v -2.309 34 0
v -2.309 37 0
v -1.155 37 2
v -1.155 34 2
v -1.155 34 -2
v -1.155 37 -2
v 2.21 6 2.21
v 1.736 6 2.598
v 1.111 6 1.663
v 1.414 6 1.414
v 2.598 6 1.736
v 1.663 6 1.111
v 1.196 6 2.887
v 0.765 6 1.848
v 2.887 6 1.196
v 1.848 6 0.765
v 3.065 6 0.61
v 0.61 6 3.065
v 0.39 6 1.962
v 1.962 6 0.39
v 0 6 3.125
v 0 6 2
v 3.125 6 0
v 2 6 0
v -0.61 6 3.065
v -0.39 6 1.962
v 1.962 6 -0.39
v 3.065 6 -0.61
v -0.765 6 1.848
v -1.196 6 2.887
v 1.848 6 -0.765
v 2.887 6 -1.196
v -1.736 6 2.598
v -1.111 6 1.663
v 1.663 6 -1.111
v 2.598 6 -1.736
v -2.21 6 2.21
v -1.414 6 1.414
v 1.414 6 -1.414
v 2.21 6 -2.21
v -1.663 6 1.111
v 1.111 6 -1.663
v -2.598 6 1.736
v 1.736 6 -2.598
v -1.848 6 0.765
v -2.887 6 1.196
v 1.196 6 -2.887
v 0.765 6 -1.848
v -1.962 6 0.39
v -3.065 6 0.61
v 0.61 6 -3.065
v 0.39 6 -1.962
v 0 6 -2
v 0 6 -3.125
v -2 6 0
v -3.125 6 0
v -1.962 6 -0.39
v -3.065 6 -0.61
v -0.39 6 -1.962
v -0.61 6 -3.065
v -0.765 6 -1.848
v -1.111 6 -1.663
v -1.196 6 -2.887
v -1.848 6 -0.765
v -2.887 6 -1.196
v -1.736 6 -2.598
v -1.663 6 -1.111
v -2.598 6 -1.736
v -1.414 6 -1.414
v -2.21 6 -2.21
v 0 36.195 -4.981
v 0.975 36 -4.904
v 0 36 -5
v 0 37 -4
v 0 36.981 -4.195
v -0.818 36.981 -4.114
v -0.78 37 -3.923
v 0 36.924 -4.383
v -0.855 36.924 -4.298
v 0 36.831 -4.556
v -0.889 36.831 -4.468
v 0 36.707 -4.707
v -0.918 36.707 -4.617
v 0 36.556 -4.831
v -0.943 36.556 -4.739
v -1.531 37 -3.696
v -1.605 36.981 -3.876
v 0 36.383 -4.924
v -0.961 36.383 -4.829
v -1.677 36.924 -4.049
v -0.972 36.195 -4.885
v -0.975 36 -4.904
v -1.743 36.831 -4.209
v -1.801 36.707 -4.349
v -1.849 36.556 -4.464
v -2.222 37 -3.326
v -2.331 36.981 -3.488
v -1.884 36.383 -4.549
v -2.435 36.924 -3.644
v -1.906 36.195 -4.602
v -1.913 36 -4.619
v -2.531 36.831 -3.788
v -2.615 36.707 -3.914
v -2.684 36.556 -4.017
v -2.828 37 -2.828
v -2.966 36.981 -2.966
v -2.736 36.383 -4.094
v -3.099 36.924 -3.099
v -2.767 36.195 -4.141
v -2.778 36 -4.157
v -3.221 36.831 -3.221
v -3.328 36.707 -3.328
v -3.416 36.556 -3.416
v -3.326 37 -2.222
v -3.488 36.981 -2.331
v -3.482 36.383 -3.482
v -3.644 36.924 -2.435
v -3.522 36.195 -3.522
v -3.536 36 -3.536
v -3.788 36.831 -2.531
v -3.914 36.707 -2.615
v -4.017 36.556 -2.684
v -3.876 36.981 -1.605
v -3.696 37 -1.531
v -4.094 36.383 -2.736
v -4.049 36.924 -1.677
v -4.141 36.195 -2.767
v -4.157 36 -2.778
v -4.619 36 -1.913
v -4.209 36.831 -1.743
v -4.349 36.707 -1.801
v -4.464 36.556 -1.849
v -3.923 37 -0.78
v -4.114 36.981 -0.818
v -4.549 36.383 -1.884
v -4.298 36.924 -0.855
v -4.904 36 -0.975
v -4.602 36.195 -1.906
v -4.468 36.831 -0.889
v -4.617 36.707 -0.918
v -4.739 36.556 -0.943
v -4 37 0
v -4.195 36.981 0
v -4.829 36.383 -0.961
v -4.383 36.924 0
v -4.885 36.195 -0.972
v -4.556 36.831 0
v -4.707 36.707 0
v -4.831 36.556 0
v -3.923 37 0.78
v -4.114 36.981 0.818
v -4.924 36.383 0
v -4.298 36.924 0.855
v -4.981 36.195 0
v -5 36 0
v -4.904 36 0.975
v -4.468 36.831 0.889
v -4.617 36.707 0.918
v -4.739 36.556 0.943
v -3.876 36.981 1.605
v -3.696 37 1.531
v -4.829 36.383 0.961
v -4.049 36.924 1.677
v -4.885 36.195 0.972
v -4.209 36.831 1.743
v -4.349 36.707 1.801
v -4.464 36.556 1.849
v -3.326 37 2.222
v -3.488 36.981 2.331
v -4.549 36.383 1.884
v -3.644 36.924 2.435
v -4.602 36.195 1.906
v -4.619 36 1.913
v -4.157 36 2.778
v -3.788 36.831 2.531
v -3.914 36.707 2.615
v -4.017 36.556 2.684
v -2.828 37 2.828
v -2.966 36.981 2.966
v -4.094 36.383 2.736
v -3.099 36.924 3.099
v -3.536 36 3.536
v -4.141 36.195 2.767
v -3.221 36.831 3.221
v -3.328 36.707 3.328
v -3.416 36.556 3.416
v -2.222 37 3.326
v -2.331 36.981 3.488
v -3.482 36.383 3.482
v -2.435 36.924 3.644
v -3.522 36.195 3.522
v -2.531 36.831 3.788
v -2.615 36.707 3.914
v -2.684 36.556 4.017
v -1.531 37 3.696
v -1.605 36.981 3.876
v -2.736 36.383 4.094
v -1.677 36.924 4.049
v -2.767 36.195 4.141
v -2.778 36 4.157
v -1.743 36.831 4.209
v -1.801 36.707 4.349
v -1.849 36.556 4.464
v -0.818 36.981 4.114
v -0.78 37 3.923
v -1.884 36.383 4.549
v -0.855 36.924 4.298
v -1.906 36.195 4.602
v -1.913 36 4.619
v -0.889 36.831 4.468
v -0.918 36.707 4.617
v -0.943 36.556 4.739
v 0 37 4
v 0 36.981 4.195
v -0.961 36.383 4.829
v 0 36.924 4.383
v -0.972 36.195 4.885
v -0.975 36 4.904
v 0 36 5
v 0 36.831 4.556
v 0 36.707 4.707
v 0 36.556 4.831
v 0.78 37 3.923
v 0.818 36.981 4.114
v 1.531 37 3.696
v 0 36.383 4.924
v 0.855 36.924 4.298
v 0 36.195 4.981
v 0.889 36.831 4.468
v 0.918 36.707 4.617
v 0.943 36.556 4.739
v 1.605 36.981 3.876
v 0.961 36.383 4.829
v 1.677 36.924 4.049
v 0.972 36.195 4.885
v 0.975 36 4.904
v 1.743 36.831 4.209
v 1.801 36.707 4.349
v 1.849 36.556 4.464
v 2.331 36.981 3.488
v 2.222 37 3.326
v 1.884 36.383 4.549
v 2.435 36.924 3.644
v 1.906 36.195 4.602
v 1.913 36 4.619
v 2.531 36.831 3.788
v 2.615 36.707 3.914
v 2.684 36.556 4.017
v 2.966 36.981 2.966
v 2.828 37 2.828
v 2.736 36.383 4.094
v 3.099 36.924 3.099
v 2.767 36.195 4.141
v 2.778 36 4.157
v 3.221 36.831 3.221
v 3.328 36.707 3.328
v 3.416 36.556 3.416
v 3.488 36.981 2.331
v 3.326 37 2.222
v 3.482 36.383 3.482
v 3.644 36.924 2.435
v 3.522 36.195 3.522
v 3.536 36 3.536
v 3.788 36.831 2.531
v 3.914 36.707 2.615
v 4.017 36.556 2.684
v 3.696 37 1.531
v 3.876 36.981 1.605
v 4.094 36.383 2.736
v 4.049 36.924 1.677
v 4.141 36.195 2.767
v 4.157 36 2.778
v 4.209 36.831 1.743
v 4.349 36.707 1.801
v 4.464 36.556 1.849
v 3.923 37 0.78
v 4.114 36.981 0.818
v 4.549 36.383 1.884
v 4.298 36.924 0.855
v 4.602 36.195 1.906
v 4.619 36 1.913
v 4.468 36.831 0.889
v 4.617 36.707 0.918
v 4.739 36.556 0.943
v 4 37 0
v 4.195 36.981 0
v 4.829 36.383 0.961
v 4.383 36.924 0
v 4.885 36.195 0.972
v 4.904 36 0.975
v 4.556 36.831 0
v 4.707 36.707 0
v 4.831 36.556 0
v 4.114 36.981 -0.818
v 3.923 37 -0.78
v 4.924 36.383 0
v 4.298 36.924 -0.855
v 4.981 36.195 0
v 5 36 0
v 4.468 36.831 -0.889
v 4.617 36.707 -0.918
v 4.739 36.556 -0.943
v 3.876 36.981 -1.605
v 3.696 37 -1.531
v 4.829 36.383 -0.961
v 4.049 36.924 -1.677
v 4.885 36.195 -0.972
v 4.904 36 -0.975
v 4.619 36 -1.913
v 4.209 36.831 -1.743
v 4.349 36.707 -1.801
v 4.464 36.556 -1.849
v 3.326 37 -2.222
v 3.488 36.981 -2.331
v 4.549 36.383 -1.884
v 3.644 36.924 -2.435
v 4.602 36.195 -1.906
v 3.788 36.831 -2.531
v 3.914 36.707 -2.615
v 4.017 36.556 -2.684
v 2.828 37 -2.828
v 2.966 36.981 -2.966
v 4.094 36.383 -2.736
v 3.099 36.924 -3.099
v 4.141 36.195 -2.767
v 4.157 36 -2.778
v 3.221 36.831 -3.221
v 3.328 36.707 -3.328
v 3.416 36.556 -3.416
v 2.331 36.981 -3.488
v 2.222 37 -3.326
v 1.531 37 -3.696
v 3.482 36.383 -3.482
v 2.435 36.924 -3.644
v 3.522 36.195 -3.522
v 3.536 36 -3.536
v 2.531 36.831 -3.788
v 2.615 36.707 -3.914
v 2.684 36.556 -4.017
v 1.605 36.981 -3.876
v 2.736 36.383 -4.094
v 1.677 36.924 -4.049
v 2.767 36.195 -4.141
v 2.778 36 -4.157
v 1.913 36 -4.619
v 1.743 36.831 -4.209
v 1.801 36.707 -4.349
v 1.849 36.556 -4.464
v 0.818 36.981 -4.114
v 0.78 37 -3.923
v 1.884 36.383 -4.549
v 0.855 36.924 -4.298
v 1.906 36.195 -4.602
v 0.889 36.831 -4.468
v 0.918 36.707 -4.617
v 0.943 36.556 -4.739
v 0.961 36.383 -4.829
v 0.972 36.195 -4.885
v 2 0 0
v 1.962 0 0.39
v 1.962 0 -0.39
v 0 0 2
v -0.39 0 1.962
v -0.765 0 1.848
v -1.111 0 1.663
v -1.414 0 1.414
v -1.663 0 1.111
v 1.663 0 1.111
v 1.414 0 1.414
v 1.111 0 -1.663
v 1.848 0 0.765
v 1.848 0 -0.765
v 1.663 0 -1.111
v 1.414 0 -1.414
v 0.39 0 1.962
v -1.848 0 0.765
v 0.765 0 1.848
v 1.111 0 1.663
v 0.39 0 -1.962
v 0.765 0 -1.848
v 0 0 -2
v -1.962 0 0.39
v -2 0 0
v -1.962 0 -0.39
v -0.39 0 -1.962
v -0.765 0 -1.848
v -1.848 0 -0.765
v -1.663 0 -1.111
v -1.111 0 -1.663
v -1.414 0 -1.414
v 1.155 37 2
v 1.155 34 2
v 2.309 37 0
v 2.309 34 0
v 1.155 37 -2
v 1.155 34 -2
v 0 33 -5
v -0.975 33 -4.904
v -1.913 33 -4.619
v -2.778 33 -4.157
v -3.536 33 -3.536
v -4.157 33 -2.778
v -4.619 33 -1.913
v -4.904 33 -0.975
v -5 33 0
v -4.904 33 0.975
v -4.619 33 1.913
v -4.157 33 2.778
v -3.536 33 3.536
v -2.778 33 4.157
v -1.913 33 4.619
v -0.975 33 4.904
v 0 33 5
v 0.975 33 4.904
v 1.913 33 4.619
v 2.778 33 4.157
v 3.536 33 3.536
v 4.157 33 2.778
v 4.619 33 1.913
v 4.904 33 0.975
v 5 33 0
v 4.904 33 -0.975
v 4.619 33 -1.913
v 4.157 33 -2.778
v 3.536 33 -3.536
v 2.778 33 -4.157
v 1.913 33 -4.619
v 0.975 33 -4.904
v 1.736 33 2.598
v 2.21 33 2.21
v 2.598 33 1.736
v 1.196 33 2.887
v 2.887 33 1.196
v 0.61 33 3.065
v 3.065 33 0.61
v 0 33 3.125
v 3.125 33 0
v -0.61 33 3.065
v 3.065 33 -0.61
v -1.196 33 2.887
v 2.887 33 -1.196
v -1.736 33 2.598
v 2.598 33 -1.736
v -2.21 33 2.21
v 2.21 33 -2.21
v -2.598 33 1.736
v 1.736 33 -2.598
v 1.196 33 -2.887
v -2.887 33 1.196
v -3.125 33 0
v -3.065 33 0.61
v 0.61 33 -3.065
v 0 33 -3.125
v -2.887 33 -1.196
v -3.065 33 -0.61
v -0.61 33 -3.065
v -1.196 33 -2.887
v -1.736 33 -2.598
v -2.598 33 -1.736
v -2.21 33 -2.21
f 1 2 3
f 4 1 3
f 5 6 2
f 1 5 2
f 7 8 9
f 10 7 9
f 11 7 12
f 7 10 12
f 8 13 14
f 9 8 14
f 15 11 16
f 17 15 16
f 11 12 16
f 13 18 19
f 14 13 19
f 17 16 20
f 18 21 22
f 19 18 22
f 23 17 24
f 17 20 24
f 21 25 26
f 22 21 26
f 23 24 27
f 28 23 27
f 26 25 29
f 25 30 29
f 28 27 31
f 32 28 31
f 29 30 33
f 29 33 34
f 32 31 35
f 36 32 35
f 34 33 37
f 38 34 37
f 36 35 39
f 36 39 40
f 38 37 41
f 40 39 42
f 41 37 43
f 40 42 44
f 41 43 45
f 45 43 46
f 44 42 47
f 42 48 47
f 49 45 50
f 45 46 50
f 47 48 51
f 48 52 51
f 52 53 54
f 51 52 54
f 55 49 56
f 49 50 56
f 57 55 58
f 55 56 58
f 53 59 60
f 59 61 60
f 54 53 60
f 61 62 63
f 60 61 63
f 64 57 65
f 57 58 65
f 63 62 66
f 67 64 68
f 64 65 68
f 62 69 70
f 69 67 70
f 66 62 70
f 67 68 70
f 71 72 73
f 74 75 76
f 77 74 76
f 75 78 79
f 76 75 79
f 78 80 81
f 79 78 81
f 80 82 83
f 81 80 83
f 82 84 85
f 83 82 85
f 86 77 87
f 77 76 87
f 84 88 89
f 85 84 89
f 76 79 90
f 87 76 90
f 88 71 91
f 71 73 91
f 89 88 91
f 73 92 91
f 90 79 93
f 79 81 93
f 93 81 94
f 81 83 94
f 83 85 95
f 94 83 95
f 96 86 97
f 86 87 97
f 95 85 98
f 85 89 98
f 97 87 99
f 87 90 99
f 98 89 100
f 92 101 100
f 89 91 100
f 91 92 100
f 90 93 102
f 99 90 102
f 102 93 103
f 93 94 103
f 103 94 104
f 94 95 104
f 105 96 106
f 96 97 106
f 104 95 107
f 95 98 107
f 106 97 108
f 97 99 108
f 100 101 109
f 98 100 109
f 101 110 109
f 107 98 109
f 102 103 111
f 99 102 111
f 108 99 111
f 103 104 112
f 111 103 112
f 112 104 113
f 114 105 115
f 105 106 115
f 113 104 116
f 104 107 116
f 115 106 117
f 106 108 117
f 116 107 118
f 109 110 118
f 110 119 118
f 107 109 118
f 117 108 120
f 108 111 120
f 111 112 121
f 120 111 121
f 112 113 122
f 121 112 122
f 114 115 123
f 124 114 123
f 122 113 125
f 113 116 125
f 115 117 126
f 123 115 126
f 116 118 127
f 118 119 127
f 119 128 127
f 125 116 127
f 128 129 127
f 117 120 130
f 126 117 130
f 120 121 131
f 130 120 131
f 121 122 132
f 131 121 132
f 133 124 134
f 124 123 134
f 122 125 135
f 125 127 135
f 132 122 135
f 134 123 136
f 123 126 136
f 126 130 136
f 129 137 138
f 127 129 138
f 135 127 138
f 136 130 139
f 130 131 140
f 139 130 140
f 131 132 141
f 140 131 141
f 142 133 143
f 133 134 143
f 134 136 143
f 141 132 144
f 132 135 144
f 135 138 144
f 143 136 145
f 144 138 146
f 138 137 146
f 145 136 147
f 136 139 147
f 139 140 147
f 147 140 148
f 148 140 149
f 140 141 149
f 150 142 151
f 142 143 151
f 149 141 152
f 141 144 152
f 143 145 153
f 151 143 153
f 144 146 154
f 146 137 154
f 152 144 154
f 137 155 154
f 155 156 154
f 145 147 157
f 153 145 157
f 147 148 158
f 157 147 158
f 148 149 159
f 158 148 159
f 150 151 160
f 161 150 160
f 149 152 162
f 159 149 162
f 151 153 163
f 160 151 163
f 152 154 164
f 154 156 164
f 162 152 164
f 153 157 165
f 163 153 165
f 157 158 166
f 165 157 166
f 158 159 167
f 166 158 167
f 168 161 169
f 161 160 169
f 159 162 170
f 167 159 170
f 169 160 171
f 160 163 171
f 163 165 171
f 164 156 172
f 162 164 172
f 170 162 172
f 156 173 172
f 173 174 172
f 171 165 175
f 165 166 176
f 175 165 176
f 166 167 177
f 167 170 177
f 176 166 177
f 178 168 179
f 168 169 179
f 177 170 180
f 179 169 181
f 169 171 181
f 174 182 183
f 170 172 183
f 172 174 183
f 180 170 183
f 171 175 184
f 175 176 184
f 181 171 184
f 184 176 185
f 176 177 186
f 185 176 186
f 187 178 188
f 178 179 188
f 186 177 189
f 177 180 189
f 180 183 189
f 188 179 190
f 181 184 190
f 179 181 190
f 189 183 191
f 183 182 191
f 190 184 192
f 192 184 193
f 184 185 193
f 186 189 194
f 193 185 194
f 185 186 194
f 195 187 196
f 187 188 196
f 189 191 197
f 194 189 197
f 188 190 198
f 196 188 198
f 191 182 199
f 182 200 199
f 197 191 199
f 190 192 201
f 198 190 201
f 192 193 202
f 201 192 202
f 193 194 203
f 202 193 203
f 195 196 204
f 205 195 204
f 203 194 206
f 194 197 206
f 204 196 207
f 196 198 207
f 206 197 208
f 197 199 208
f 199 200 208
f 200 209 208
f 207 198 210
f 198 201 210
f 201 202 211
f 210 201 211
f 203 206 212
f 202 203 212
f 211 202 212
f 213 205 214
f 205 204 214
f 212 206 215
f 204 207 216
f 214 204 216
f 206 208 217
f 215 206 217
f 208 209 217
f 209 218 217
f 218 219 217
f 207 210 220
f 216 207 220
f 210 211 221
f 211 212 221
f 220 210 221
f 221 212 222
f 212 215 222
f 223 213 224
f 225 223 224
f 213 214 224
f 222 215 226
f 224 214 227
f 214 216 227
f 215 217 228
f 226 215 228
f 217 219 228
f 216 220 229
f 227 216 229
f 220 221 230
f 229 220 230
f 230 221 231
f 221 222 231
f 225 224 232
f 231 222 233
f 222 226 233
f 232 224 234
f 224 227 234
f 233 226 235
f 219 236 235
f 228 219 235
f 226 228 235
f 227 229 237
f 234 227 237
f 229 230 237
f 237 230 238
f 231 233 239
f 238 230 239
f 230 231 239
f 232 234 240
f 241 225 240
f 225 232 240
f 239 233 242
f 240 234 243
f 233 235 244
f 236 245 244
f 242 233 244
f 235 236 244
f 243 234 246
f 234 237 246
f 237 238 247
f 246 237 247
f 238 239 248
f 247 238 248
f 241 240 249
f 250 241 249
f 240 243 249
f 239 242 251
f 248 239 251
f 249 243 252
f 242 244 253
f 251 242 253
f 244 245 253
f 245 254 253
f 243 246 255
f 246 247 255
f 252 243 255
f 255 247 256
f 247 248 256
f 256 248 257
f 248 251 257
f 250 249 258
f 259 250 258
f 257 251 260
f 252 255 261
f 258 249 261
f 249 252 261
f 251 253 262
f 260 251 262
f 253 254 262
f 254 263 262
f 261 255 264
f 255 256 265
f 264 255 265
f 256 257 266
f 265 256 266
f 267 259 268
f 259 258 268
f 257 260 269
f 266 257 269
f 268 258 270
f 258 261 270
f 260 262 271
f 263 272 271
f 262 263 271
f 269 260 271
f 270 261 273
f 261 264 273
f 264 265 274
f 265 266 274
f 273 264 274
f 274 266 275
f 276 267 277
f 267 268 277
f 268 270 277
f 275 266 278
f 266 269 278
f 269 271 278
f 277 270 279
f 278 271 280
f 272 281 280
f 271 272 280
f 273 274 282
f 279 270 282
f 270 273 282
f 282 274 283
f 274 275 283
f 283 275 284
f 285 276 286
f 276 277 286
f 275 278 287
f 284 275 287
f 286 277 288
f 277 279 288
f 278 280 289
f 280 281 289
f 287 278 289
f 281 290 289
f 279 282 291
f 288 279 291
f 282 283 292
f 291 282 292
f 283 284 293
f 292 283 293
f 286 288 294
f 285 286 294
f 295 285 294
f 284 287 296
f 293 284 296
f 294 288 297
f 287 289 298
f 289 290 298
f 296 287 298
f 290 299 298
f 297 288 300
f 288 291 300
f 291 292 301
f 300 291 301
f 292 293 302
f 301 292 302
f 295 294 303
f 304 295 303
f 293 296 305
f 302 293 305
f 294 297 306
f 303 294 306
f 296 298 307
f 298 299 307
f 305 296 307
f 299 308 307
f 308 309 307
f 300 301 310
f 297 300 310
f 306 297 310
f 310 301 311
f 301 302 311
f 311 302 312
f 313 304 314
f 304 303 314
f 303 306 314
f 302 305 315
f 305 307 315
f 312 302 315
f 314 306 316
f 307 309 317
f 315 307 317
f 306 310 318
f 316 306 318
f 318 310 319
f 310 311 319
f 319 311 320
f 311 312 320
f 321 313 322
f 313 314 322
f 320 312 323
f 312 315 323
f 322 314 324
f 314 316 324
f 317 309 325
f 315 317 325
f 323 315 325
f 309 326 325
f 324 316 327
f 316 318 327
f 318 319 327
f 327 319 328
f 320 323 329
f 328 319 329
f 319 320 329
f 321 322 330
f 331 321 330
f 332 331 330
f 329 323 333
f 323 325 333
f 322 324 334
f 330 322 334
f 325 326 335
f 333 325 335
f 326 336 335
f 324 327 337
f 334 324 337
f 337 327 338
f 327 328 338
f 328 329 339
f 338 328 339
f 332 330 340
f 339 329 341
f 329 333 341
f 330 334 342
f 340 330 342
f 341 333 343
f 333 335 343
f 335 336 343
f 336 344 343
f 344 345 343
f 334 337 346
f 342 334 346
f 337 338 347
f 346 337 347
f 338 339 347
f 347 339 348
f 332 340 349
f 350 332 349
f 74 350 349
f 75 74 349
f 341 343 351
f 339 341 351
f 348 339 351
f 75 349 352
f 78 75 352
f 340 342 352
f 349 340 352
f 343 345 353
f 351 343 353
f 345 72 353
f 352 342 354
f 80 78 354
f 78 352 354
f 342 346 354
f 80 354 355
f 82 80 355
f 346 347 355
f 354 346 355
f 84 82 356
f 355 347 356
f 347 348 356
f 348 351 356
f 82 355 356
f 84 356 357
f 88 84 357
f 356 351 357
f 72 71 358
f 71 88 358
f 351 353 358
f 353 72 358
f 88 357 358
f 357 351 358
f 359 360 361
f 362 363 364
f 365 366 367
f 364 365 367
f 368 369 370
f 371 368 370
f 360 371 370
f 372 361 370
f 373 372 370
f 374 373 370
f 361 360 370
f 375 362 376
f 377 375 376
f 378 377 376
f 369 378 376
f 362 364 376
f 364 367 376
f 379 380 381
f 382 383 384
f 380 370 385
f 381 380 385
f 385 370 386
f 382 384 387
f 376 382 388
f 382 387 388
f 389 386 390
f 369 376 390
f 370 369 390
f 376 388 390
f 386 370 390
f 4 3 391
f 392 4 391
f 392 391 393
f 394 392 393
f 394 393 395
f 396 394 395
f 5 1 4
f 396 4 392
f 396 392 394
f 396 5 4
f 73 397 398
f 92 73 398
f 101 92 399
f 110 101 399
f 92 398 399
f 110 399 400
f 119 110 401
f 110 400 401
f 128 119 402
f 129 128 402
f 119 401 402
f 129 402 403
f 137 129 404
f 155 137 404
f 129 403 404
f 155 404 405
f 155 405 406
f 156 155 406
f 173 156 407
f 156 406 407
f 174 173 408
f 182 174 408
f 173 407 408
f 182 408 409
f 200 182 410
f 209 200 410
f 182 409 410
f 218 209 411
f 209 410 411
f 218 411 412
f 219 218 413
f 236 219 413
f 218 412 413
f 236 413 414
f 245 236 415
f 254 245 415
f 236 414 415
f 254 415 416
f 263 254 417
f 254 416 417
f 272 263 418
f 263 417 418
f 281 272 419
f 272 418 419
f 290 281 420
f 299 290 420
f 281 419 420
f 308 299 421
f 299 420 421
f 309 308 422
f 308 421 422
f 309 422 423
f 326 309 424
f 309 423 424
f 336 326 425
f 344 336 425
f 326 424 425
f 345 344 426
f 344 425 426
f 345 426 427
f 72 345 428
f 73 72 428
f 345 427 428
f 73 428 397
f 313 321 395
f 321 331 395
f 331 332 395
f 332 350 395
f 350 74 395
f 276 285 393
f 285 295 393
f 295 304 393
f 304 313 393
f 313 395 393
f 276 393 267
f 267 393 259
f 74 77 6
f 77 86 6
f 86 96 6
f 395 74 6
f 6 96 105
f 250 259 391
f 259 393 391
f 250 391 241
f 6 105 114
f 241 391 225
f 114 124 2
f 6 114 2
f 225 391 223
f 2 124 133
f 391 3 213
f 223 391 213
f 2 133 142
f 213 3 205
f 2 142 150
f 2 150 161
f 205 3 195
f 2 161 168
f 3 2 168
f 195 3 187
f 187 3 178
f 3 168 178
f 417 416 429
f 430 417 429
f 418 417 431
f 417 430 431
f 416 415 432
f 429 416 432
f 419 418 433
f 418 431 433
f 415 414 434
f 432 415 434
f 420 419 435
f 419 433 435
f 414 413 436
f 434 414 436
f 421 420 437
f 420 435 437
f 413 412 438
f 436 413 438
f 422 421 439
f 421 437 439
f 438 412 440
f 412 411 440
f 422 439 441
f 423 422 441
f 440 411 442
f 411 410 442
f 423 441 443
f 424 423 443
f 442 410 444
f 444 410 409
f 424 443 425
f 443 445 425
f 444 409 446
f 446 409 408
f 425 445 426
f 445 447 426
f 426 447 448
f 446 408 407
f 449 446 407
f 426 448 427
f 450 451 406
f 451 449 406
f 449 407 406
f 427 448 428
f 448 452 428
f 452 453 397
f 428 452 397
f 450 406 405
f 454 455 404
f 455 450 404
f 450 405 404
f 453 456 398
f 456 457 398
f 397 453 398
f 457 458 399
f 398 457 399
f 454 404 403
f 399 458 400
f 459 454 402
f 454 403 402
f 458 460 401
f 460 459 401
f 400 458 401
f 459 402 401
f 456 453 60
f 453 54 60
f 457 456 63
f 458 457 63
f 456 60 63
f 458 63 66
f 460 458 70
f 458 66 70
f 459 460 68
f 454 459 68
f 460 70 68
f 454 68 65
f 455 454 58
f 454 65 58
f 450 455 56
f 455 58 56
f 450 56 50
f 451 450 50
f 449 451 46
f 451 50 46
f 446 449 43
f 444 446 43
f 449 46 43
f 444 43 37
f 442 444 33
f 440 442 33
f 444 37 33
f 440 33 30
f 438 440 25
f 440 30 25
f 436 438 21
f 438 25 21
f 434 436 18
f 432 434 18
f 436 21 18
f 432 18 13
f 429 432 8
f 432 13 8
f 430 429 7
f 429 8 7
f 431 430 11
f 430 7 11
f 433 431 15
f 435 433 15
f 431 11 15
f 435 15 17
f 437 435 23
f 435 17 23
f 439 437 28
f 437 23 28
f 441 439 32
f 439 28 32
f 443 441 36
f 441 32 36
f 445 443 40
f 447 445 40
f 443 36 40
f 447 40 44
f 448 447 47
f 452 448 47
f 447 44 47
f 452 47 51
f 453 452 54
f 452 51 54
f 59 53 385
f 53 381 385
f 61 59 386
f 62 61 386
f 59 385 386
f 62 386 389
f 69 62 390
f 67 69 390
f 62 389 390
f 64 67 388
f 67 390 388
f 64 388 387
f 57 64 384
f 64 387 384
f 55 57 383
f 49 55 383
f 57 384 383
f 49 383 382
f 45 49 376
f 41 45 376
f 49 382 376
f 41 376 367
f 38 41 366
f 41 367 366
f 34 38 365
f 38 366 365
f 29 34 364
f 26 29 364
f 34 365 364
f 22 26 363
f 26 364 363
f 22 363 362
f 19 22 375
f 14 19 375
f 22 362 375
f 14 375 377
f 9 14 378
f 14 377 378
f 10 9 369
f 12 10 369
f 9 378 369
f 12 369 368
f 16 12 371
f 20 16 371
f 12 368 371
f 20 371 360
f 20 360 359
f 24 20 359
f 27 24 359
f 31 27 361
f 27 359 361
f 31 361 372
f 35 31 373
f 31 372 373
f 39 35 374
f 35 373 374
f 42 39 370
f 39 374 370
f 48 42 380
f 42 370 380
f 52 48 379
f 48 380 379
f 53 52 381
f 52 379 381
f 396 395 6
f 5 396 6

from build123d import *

# Parameters (mm, degrees)
CUT_EXTRUDE1_DEPTH = 3
FILLET1_R          = 1


with BuildPart() as part:
    # Sketch1 → Revolve1 (revolve)
    with BuildSketch(Plane.XY, mode=Mode.PRIVATE) as revolve1_sk:
        Polygon((0, 0), (0, 37), (-5, 37), (-5, 33), (-3.125, 33), (-3.125, 6), (-2, 6), (-2, 0), align=None)
    revolve(revolve1_sk.sketch.rotate(Axis((0, 0, 0), (0, 1, 0)), 270), axis=Axis((0, 0, 0), (0, 1, 0)))

    # Sketch3 → Cut-Extrude1 (cut)
    with BuildSketch(Plane(origin=(0, 37, 0), x_dir=(1, 0, 0), z_dir=(0, 1, 0))):
        Polygon((1.154700538, 2), (-1.154700538, 2), (-2.309401077, 0), (-1.154700538, -2), (1.154700538, -2), (2.309401077, 0), align=None)
    extrude(amount=-CUT_EXTRUDE1_DEPTH, mode=Mode.SUBTRACT)

    # Fillet1
    fillet1_edges = [part.edges().sort_by_distance(p)[0] for p in [
        (0, 37, 5),
    ]]
    fillet(fillet1_edges, radius=FILLET1_R)


solid = part.part
